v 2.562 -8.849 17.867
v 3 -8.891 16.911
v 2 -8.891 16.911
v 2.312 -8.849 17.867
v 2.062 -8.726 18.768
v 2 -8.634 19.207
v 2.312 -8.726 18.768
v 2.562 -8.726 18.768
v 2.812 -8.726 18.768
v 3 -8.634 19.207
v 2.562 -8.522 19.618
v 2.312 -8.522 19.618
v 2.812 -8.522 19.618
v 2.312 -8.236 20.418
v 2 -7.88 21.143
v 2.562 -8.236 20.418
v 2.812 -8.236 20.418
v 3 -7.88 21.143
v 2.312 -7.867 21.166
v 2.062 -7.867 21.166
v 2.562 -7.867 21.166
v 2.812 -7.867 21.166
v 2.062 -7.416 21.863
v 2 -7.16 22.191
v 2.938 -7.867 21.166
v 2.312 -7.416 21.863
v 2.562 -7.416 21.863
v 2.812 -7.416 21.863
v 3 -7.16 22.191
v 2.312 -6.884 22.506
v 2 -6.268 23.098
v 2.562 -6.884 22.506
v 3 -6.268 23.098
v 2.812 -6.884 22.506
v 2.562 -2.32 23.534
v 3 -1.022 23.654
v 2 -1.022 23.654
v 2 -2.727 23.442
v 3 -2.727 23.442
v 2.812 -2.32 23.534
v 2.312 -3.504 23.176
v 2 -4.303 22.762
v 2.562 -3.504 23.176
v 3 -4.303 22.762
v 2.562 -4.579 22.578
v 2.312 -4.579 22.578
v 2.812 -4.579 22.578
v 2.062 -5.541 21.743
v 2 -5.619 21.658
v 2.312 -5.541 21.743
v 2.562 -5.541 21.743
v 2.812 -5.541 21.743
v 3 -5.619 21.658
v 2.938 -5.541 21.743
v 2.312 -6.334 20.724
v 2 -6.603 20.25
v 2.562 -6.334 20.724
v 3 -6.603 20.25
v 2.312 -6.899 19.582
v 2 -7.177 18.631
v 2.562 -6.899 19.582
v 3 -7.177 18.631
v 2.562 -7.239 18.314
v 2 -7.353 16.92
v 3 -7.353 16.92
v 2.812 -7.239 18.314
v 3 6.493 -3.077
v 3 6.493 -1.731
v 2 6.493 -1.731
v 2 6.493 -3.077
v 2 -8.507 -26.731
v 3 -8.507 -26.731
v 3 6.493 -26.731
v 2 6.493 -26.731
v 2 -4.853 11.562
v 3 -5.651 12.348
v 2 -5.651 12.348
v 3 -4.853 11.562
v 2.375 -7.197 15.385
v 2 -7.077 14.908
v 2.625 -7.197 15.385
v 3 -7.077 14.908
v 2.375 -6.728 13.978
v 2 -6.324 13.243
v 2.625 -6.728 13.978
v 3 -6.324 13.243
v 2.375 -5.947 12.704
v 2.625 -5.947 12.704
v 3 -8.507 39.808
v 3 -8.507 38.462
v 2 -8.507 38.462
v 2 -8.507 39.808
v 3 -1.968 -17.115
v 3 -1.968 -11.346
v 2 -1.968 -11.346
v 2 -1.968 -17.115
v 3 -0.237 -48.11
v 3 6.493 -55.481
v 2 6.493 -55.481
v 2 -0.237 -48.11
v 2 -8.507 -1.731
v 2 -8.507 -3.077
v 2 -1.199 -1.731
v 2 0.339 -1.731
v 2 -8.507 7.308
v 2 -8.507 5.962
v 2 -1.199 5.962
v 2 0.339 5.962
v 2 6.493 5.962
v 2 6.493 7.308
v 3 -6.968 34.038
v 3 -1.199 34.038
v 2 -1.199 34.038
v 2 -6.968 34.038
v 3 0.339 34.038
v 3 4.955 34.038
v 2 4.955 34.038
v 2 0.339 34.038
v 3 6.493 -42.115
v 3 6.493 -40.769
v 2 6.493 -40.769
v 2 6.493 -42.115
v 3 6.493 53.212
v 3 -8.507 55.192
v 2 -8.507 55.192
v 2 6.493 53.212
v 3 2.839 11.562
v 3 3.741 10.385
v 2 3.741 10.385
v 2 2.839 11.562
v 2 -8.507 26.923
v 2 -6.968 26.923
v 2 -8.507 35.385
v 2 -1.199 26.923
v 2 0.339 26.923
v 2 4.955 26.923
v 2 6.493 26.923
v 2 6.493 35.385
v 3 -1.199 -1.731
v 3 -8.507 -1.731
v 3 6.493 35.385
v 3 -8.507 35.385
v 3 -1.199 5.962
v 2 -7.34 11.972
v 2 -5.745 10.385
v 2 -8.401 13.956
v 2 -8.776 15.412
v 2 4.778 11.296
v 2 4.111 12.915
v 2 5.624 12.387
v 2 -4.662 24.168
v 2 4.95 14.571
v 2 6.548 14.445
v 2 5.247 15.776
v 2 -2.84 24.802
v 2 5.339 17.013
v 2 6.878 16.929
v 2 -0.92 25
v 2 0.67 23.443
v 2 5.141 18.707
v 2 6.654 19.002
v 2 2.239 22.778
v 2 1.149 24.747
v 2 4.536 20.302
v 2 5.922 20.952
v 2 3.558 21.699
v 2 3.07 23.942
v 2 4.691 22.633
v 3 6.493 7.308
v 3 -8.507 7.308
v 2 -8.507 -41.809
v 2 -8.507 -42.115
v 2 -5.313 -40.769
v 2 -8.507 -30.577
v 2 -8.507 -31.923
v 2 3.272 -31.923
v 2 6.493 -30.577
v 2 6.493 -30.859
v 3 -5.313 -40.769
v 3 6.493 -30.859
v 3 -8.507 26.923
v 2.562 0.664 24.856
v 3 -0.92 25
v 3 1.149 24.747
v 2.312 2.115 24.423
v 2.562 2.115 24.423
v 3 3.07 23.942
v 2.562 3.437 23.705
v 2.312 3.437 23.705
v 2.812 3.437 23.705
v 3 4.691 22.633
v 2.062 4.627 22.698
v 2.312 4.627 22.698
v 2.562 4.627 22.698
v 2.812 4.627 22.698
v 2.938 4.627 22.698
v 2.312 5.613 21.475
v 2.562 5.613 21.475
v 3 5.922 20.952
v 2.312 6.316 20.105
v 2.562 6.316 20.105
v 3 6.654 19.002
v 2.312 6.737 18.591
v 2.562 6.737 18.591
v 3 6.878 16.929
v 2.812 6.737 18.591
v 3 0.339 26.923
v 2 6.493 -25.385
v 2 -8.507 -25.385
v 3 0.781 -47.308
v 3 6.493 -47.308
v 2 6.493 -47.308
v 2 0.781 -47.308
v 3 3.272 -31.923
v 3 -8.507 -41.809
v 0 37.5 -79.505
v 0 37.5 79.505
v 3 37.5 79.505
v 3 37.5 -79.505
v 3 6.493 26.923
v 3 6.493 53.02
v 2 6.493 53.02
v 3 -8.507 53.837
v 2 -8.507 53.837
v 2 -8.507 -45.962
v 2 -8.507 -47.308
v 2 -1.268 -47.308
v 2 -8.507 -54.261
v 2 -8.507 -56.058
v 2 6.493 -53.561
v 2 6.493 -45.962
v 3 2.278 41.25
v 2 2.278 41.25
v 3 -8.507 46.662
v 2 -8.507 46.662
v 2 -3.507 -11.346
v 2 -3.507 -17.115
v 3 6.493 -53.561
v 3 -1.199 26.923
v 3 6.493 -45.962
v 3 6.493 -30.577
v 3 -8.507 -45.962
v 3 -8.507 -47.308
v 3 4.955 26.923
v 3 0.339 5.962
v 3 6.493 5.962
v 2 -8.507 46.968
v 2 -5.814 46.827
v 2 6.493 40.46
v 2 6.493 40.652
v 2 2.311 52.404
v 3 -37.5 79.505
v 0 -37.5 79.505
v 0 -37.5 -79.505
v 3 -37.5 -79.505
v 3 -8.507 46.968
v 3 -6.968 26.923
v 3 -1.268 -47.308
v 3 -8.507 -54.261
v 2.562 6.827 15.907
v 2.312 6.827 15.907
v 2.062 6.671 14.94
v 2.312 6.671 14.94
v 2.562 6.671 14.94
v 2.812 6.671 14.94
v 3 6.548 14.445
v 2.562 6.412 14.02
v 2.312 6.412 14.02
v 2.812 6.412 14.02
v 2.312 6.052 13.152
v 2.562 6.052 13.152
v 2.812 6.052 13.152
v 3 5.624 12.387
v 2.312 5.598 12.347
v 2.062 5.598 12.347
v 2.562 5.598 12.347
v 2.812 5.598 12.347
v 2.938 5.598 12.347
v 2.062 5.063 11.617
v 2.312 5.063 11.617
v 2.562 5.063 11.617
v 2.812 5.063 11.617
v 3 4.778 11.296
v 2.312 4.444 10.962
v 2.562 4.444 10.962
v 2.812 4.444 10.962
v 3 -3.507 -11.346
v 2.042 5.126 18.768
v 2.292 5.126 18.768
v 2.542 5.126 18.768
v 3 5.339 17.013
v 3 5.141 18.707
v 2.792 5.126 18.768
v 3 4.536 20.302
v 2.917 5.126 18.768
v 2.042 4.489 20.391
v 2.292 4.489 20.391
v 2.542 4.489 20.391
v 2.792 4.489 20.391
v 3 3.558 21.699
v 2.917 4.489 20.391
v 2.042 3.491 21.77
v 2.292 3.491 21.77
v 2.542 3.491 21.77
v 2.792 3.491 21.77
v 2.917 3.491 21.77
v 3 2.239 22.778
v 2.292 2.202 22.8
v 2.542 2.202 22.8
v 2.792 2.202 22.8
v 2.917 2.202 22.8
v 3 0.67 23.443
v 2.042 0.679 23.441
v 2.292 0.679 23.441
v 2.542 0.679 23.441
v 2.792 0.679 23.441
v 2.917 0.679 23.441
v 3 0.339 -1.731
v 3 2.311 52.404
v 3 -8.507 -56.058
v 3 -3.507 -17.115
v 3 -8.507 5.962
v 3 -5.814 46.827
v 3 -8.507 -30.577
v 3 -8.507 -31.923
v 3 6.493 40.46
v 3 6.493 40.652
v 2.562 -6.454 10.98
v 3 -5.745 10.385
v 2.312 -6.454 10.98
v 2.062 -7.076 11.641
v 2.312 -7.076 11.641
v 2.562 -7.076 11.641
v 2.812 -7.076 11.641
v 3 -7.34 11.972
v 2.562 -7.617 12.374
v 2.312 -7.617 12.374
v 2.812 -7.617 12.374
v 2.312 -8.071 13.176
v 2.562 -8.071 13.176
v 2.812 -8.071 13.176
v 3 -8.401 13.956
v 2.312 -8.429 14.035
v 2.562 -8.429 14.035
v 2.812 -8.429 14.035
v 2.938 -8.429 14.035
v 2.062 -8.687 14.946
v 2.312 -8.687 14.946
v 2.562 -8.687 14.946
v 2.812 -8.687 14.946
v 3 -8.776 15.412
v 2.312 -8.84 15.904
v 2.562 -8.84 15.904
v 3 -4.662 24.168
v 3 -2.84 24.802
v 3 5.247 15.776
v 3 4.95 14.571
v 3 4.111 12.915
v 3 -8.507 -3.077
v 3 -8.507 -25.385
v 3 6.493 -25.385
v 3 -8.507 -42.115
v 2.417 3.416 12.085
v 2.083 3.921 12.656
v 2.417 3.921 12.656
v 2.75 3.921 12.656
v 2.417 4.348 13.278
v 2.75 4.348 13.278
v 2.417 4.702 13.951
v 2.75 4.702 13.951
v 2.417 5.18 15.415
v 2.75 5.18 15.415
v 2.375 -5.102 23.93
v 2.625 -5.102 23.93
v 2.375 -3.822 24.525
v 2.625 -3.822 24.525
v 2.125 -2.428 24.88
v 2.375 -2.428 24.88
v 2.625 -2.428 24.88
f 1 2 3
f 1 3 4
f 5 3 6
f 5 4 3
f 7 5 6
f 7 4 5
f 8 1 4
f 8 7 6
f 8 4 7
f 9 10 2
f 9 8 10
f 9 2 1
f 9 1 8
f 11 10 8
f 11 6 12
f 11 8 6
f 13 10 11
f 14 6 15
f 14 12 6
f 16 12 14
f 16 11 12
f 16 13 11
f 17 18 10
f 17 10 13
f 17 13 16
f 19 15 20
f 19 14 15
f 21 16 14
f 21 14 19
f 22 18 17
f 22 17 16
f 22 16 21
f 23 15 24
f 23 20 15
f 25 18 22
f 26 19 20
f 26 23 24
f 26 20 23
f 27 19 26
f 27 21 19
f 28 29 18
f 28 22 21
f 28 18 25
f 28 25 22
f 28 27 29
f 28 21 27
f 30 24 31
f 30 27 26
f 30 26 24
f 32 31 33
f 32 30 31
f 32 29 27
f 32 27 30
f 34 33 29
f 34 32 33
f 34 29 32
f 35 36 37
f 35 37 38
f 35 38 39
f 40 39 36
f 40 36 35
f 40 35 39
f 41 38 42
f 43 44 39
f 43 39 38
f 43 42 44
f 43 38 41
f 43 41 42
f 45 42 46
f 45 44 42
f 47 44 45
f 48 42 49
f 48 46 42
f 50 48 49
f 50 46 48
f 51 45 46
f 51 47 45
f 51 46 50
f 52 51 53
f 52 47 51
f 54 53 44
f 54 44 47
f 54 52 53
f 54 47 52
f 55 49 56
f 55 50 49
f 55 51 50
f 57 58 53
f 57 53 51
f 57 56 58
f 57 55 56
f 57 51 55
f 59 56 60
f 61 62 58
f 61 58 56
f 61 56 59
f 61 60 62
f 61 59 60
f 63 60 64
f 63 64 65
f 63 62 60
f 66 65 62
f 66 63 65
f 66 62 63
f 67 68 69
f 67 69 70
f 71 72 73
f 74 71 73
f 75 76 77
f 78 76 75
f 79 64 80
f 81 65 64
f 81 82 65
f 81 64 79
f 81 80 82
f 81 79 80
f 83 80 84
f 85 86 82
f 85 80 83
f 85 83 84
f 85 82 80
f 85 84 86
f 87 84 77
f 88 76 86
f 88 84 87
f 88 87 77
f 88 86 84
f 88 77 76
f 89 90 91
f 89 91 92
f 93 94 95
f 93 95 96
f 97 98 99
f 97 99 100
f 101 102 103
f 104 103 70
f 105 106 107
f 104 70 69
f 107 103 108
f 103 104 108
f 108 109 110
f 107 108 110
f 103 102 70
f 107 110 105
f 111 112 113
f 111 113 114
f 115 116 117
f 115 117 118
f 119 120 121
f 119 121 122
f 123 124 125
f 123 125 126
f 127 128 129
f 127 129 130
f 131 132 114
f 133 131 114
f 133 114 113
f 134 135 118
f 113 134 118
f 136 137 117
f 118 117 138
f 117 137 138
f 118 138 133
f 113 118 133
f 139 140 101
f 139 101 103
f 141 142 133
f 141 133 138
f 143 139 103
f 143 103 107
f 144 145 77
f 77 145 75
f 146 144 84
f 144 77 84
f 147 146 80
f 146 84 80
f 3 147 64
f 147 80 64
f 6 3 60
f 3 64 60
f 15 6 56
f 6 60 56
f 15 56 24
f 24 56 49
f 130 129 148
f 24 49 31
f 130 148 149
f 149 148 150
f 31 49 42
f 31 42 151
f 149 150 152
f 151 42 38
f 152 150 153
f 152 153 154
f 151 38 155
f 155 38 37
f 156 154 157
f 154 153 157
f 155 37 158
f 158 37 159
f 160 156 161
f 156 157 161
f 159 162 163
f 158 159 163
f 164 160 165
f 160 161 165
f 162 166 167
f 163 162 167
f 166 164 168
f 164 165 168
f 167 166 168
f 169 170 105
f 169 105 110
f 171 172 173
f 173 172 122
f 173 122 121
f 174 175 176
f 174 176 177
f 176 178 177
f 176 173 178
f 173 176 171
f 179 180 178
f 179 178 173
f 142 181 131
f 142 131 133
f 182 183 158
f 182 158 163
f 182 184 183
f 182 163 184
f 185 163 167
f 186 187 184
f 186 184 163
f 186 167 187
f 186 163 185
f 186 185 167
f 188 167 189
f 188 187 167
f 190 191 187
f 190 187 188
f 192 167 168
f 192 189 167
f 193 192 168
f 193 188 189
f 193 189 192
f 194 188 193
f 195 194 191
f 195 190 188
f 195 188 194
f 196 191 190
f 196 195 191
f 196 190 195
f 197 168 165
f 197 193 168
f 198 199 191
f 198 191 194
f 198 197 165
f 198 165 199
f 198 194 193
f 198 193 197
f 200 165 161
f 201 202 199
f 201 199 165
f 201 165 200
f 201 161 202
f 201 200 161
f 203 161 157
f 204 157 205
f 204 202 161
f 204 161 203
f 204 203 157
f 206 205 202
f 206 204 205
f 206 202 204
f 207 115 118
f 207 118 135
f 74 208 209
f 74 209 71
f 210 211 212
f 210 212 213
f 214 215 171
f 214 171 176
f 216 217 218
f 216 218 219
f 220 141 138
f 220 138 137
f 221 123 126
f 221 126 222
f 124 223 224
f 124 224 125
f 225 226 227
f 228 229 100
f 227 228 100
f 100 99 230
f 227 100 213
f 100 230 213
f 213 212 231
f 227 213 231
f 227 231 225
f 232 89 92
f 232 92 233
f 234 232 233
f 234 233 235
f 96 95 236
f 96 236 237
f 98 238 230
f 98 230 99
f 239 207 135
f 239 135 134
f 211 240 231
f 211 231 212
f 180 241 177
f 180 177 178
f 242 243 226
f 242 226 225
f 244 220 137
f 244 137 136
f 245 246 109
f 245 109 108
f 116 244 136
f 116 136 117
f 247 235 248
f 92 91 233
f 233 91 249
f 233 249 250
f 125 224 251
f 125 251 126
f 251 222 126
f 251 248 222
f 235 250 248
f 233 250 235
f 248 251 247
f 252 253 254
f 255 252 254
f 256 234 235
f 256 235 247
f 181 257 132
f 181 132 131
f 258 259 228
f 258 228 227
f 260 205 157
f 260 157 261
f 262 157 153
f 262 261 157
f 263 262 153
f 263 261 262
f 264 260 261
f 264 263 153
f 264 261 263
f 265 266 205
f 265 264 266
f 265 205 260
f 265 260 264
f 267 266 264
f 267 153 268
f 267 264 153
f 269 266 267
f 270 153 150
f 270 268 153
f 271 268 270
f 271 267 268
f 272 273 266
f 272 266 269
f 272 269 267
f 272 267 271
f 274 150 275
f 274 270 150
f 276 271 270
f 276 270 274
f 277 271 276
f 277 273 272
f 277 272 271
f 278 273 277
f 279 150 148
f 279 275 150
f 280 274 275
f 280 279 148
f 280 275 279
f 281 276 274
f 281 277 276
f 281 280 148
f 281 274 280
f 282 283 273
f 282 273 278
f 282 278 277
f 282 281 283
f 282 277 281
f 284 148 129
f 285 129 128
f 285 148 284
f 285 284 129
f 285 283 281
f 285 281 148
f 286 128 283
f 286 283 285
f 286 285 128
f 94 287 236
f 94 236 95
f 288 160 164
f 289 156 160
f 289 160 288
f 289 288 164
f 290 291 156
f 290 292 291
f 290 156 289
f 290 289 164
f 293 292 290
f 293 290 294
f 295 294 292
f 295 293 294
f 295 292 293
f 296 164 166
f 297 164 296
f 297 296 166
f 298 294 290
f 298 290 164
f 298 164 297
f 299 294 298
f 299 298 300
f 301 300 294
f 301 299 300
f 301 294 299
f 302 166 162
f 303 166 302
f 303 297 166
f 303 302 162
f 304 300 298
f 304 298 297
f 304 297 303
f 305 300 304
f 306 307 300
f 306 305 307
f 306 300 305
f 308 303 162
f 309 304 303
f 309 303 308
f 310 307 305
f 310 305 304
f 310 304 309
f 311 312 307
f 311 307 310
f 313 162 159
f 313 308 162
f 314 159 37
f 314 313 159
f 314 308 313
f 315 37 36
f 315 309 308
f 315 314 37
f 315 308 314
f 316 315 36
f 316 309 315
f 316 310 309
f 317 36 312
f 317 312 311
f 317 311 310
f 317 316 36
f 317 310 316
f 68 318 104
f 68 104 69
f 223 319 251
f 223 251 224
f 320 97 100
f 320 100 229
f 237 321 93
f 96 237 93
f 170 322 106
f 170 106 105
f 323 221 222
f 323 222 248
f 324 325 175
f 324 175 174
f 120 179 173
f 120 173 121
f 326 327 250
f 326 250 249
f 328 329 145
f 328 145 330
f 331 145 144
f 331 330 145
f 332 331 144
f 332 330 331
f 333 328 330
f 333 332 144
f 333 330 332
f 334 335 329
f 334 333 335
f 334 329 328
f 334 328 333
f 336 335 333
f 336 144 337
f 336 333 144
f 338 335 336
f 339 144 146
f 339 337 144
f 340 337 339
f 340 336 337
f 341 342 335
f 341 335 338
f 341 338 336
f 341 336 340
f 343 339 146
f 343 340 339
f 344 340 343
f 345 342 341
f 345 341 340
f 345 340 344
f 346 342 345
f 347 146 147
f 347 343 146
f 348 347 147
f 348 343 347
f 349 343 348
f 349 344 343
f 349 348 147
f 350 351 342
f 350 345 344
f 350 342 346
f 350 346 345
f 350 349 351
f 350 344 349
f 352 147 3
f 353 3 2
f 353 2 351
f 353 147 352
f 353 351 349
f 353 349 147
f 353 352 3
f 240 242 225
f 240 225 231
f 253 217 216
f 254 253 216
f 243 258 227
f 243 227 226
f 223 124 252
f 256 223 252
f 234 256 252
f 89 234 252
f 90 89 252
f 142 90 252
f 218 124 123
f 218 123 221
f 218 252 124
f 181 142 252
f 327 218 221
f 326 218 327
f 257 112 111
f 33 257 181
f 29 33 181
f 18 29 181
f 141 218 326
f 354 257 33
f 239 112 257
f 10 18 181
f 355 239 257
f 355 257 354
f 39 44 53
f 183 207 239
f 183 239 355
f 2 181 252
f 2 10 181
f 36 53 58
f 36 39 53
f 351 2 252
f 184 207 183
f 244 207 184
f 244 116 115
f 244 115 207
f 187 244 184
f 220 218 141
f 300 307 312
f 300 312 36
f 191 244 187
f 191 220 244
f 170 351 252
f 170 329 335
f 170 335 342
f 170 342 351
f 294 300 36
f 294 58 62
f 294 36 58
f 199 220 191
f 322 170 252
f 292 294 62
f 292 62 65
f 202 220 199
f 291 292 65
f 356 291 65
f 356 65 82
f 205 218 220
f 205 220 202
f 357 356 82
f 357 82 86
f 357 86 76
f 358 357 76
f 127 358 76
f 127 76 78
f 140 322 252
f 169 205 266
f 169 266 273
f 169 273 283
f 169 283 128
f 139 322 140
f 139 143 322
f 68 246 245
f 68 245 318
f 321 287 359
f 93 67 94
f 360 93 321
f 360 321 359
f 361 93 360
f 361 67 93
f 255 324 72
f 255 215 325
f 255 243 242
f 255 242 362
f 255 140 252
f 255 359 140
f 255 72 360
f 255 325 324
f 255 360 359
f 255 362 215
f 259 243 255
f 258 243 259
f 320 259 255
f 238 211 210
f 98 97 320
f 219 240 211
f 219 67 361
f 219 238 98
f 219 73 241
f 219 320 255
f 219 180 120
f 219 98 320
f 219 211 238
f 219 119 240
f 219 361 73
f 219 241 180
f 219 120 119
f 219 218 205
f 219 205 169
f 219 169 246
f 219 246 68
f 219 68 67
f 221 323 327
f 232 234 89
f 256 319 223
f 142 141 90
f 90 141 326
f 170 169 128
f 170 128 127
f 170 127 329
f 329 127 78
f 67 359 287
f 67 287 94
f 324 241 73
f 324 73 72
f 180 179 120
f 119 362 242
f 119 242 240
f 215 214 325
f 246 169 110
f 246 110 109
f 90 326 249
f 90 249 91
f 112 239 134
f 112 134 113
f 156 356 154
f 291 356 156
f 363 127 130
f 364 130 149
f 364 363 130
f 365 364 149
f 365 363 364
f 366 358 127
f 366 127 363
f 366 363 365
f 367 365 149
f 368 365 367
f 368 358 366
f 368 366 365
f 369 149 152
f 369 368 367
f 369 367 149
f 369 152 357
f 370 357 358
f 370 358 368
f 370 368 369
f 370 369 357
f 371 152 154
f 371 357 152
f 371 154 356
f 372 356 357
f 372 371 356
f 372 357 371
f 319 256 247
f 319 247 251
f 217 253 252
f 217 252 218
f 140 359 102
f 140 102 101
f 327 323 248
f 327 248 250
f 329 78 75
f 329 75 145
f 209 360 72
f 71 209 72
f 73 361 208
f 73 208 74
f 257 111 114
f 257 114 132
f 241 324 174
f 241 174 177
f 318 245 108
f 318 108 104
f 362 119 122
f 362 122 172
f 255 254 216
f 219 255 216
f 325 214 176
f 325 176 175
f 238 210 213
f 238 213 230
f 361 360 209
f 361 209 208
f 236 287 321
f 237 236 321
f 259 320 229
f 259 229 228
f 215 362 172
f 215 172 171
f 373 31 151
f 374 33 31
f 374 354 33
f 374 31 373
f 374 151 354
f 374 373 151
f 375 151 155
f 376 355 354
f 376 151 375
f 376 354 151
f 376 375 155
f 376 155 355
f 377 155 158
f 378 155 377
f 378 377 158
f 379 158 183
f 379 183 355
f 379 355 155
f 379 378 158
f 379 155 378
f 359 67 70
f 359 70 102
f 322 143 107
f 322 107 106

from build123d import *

# Parameters (mm, degrees)
CROQUIS1_W              = 159.01
CROQUIS1_H              = 75
SALIENTE_EXTRUIR1_DEPTH = 3
CROQUIS2_W              = 5.769230769
CROQUIS2_H              = 1.538461538
CROQUIS2_W_2            = 1.346153846
CROQUIS2_H_2            = 15
CORTAR_EXTRUIR1_DEPTH   = 1


with BuildPart() as part:
    # Croquis1 → Saliente-Extruir1 (new body)
    with BuildSketch(Plane(origin=(0, 0, 0), x_dir=(0, 0, -1), z_dir=(1, 0, 0))):
        Rectangle(CROQUIS1_W, CROQUIS1_H)
    extrude(amount=SALIENTE_EXTRUIR1_DEPTH)

    # Croquis2 → Cortar-Extruir1 (cut)
    with BuildSketch(Plane(origin=(3, 0, 0), x_dir=(0, 0, -1), z_dir=(1, 0, 0))):
        Polygon((-55.192307692, -8.506703652), (-53.212139423, 6.493296348), (-53.019831731, 6.493296348), (-46.826923077, -5.81439596), (-40.652043269, 6.493296348), (-40.459735577, 6.493296348), (-38.461538462, -8.506703652), (-39.807692308, -8.506703652), (-41.25, 2.277551155), (-46.661658654, -8.506703652), (-46.968149038, -8.506703652), (-52.403846154, 2.31060404), (-53.837139423, -8.506703652), align=None)
        Polygon((-35.384615385, 6.493296348), (-26.923076923, 6.493296348), (-26.923076923, 4.954834809), (-34.038461538, 4.954834809), (-34.038461538, 0.339450194), (-26.923076923, 0.339450194), (-26.923076923, -1.199011345), (-34.038461538, -1.199011345), (-34.038461538, -6.968242114), (-26.923076923, -6.968242114), (-26.923076923, -8.506703652), (-35.384615385, -8.506703652), align=None)
        with BuildLine():
            Line((-10.384615385, 3.740892502), (-11.5625, 2.839450194))
            add(Edge.make_bspline(
                [(-11.5625, 2.839450194), (-11.646525236, 2.939590065), (-11.813442865, 3.138519703), (-12.081982304, 3.417860608), (-12.361846488, 3.679568871), (-12.652928436, 3.924891213), (-12.96046752, 4.14524878), (-13.2770138, 4.352124936), (-13.607862565, 4.537558098), (-14.065369999, 4.762399467), (-14.663860778, 4.997025846), (-15.417267231, 5.19375398), (-16.203743367, 5.31898759), (-16.740304508, 5.332551196), (-17.013221154, 5.339450194)],
                knots=[0, 0, 0, 0, 0.757959112, 1.505699292, 2.245454638, 2.979532153, 3.711538275, 4.438200793, 5.171680507, 5.909471876, 7.393775596, 8.890124382, 10.418191784, 12, 12, 12, 12], degree=3))
            add(Edge.make_bspline(
                [(-17.013221154, 5.339450194), (-17.163578151, 5.337718926), (-17.462896691, 5.334272458), (-17.907104434, 5.288804778), (-18.34301751, 5.224899593), (-18.770352366, 5.130076779), (-19.188565045, 5.010194126), (-19.600389625, 4.866942352), (-19.999863625, 4.689707324), (-20.392513217, 4.493814781), (-20.768709835, 4.272554303), (-21.12466004, 4.031211367), (-21.459065617, 3.772486668), (-21.772191098, 3.495410498), (-22.06435659, 3.201230667), (-22.333445065, 2.88681206), (-22.578525395, 2.553159888), (-22.804455502, 2.204673856), (-23.006795788, 1.842369034), (-23.176209557, 1.464904447), (-23.326231509, 1.078744005), (-23.444942549, 0.679524744), (-23.538904764, 0.270055748), (-23.603737607, -0.150761915), (-23.648688198, -0.582049113), (-23.652117527, -0.874374738), (-23.653846154, -1.021727691)],
                knots=[0, 0, 0, 0, 1.054917814, 2.100044995, 3.131103042, 4.146048494, 5.169673617, 6.183595914, 7.203665975, 8.234915748, 9.262203917, 10.264457458, 11.251630812, 12.227803204, 13.197192746, 14.159520551, 15.12972552, 16.100847026, 17.073214652, 18.039054194, 19.002613845, 19.979014051, 20.95965708, 21.949030935, 22.966165397, 24, 24, 24, 24], degree=3))
            add(Edge.make_bspline(
                [(-23.653846154, -1.021727691), (-23.648438358, -1.243433348), (-23.637820868, -1.678722997), (-23.543328008, -2.316311328), (-23.39973476, -2.927114215), (-23.184525144, -3.50731354), (-22.919157785, -4.064063646), (-22.583840878, -4.587944446), (-22.195484289, -5.08687258), (-21.74859392, -5.549056641), (-21.25828328, -5.971258321), (-20.732220802, -6.343046528), (-20.171716712, -6.652967453), (-19.582959725, -6.910864366), (-18.961419237, -7.109107485), (-18.308212941, -7.248668014), (-17.624761533, -7.339705931), (-17.157749819, -7.348421737), (-16.920072115, -7.352857498)],
                knots=[0, 0, 0, 0, 1.029171465, 2.020641659, 2.987623507, 3.938342917, 4.889210282, 5.84687017, 6.821220943, 7.821438502, 8.827599549, 9.822697543, 10.807740252, 11.797342354, 12.80366471, 13.83203677, 14.896651826, 16, 16, 16, 16], degree=3))
            add(Edge.make_bspline(
                [(-16.920072115, -7.352857498), (-16.658203448, -7.345619871), (-16.142783267, -7.331374489), (-15.386920297, -7.210691992), (-14.663338444, -7.015015202), (-13.971998788, -6.741166963), (-13.314850304, -6.385172872), (-12.690864617, -5.95361054), (-12.099515029, -5.442374829), (-11.74392382, -5.052018565), (-11.5625, -4.852857498)],
                knots=[0, 0, 0, 0, 1.028121516, 2.023589091, 2.998037872, 3.967518031, 4.937445131, 5.927275754, 6.942489185, 8, 8, 8, 8], degree=3))
            Line((-11.5625, -4.852857498), (-10.384615385, -5.745285383))
            add(Edge.make_bspline(
                [(-10.384615385, -5.745285383), (-10.479407284, -5.867593034), (-10.668537035, -6.11162249), (-10.974785679, -6.455644103), (-11.297402668, -6.779232826), (-11.638784283, -7.079779774), (-11.995003389, -7.363298913), (-12.372456157, -7.621735333), (-12.766180582, -7.858696265), (-13.174842634, -8.075668799), (-13.598008118, -8.268171286), (-14.035169982, -8.432973148), (-14.484443877, -8.57493696), (-14.945850341, -8.691730975), (-15.420346442, -8.782892763), (-15.906219902, -8.843834226), (-16.404519368, -8.885585288), (-16.740696887, -8.889390642), (-16.911057692, -8.891319037)],
                knots=[0, 0, 0, 0, 0.986787822, 1.968848986, 2.935600012, 3.899624008, 4.868462664, 5.837806735, 6.815139263, 7.798259679, 8.787526145, 9.778297419, 10.776456485, 11.791383307, 12.812564526, 13.85620153, 14.913611965, 16, 16, 16, 16], degree=3))
            add(Edge.make_bspline(
                [(-16.911057692, -8.891319037), (-17.072387694, -8.890196212), (-17.391397794, -8.887975964), (-17.862392444, -8.852009532), (-18.320919219, -8.802939231), (-18.765667616, -8.729052955), (-19.199064652, -8.641862926), (-19.617181442, -8.524986112), (-20.024132344, -8.394061112), (-20.418282375, -8.240182598), (-20.799966803, -8.066541816), (-21.167954566, -7.870292277), (-21.522076419, -7.653084286), (-21.865813937, -7.41970567), (-22.194089296, -7.16266009), (-22.509747261, -6.885517371), (-22.814557874, -6.589211611), (-23.00314081, -6.375547954), (-23.097956731, -6.268121922)],
                knots=[0, 0, 0, 0, 1.114604814, 2.203992996, 3.262667896, 4.300477797, 5.318619304, 6.316056647, 7.298880507, 8.271930387, 9.238335007, 10.195173496, 11.151986948, 12.108099108, 13.064862484, 14.031167946, 15.010108607, 16, 16, 16, 16], degree=3))
            add(Edge.make_bspline(
                [(-23.097956731, -6.268121922), (-23.249823774, -6.081516826), (-23.551724389, -5.710559496), (-23.937977319, -5.109333862), (-24.268609698, -4.481612967), (-24.535935073, -3.824098986), (-24.744918215, -3.138267327), (-24.889694765, -2.423772265), (-24.98377307, -1.681281084), (-24.994531451, -1.176266275), (-25, -0.919564229)],
                knots=[0, 0, 0, 0, 0.994628077, 1.977248131, 2.950237994, 3.925870899, 4.908910175, 5.911660606, 6.938484602, 8, 8, 8, 8], degree=3))
            add(Edge.make_bspline(
                [(-25, -0.919564229), (-24.993334885, -0.649755143), (-24.980221687, -0.118922609), (-24.868811135, 0.66010862), (-24.689587722, 1.406471758), (-24.435029628, 2.11877352), (-24.112292408, 2.800760435), (-23.713606921, 3.447222742), (-23.243604883, 4.06229474), (-22.70597245, 4.636643674), (-22.116398155, 5.161812329), (-21.48503181, 5.623838916), (-20.81310918, 6.008342556), (-20.108032673, 6.329754681), (-19.364522609, 6.57680238), (-18.584165313, 6.749744609), (-17.768427107, 6.857389393), (-17.211873854, 6.870997427), (-16.929086538, 6.877911732)],
                knots=[0, 0, 0, 0, 1.032925535, 2.032216505, 3.007276963, 3.968222605, 4.92396291, 5.891752235, 6.871517503, 7.883894988, 8.900124299, 9.891468569, 10.874487609, 11.85992873, 12.854644235, 13.869047385, 14.917252991, 16, 16, 16, 16], degree=3))
            add(Edge.make_bspline(
                [(-16.929086538, 6.877911732), (-16.756738802, 6.875845426), (-16.415593813, 6.87175538), (-15.910939589, 6.831871914), (-15.41961533, 6.76538503), (-14.94128255, 6.674887588), (-14.473614195, 6.562570496), (-14.020184591, 6.416254932), (-13.578333076, 6.248955512), (-13.150846327, 6.056276372), (-12.739775397, 5.839990337), (-12.345248318, 5.602494808), (-11.970398924, 5.344084213), (-11.612589573, 5.066956318), (-11.277805811, 4.765248207), (-10.956542332, 4.44725851), (-10.65970914, 4.103827835), (-10.476481161, 3.862092404), (-10.384615385, 3.740892502)],
                knots=[0, 0, 0, 0, 1.096760587, 2.17092713, 3.219439832, 4.250915756, 5.268269357, 6.278326846, 7.281116186, 8.274029601, 9.260640565, 10.235837813, 11.203064059, 12.156899882, 13.114053108, 14.069676657, 15.032185724, 16, 16, 16, 16], degree=3))
        make_face()
        Polygon((-7.307692308, 6.493296348), (-5.961538462, 6.493296348), (-5.961538462, 0.339450194), (1.730769231, 0.339450194), (1.730769231, 6.493296348), (3.076923077, 6.493296348), (3.076923077, -8.506703652), (1.730769231, -8.506703652), (1.730769231, -1.199011345), (-5.961538462, -1.199011345), (-5.961538462, -8.506703652), (-7.307692308, -8.506703652), align=None)
        with Locations((14.23076923, -2.737472883)):
            Rectangle(CROQUIS2_W, CROQUIS2_H)
        with Locations((26.057692308, -1.006703652)):
            Rectangle(CROQUIS2_W_2, CROQUIS2_H_2)
        Polygon((30.576923077, -8.506703652), (30.576923077, 6.493296348), (30.859375, 6.493296348), (40.769230769, -5.312593075), (40.769230769, 6.493296348), (42.115384615, 6.493296348), (42.115384615, -8.506703652), (41.808894231, -8.506703652), (31.923076923, 3.272142502), (31.923076923, -8.506703652), align=None)
        Polygon((45.961538462, 6.493296348), (47.307692308, 6.493296348), (47.307692308, 0.781156925), (53.560697115, 6.493296348), (55.480769231, 6.493296348), (48.109975962, -0.237472883), (56.057692308, -8.506703652), (54.260817308, -8.506703652), (47.307692308, -1.268121922), (47.307692308, -8.506703652), (45.961538462, -8.506703652), align=None)
    extrude(amount=-CORTAR_EXTRUIR1_DEPTH, mode=Mode.SUBTRACT)


solid = part.part
